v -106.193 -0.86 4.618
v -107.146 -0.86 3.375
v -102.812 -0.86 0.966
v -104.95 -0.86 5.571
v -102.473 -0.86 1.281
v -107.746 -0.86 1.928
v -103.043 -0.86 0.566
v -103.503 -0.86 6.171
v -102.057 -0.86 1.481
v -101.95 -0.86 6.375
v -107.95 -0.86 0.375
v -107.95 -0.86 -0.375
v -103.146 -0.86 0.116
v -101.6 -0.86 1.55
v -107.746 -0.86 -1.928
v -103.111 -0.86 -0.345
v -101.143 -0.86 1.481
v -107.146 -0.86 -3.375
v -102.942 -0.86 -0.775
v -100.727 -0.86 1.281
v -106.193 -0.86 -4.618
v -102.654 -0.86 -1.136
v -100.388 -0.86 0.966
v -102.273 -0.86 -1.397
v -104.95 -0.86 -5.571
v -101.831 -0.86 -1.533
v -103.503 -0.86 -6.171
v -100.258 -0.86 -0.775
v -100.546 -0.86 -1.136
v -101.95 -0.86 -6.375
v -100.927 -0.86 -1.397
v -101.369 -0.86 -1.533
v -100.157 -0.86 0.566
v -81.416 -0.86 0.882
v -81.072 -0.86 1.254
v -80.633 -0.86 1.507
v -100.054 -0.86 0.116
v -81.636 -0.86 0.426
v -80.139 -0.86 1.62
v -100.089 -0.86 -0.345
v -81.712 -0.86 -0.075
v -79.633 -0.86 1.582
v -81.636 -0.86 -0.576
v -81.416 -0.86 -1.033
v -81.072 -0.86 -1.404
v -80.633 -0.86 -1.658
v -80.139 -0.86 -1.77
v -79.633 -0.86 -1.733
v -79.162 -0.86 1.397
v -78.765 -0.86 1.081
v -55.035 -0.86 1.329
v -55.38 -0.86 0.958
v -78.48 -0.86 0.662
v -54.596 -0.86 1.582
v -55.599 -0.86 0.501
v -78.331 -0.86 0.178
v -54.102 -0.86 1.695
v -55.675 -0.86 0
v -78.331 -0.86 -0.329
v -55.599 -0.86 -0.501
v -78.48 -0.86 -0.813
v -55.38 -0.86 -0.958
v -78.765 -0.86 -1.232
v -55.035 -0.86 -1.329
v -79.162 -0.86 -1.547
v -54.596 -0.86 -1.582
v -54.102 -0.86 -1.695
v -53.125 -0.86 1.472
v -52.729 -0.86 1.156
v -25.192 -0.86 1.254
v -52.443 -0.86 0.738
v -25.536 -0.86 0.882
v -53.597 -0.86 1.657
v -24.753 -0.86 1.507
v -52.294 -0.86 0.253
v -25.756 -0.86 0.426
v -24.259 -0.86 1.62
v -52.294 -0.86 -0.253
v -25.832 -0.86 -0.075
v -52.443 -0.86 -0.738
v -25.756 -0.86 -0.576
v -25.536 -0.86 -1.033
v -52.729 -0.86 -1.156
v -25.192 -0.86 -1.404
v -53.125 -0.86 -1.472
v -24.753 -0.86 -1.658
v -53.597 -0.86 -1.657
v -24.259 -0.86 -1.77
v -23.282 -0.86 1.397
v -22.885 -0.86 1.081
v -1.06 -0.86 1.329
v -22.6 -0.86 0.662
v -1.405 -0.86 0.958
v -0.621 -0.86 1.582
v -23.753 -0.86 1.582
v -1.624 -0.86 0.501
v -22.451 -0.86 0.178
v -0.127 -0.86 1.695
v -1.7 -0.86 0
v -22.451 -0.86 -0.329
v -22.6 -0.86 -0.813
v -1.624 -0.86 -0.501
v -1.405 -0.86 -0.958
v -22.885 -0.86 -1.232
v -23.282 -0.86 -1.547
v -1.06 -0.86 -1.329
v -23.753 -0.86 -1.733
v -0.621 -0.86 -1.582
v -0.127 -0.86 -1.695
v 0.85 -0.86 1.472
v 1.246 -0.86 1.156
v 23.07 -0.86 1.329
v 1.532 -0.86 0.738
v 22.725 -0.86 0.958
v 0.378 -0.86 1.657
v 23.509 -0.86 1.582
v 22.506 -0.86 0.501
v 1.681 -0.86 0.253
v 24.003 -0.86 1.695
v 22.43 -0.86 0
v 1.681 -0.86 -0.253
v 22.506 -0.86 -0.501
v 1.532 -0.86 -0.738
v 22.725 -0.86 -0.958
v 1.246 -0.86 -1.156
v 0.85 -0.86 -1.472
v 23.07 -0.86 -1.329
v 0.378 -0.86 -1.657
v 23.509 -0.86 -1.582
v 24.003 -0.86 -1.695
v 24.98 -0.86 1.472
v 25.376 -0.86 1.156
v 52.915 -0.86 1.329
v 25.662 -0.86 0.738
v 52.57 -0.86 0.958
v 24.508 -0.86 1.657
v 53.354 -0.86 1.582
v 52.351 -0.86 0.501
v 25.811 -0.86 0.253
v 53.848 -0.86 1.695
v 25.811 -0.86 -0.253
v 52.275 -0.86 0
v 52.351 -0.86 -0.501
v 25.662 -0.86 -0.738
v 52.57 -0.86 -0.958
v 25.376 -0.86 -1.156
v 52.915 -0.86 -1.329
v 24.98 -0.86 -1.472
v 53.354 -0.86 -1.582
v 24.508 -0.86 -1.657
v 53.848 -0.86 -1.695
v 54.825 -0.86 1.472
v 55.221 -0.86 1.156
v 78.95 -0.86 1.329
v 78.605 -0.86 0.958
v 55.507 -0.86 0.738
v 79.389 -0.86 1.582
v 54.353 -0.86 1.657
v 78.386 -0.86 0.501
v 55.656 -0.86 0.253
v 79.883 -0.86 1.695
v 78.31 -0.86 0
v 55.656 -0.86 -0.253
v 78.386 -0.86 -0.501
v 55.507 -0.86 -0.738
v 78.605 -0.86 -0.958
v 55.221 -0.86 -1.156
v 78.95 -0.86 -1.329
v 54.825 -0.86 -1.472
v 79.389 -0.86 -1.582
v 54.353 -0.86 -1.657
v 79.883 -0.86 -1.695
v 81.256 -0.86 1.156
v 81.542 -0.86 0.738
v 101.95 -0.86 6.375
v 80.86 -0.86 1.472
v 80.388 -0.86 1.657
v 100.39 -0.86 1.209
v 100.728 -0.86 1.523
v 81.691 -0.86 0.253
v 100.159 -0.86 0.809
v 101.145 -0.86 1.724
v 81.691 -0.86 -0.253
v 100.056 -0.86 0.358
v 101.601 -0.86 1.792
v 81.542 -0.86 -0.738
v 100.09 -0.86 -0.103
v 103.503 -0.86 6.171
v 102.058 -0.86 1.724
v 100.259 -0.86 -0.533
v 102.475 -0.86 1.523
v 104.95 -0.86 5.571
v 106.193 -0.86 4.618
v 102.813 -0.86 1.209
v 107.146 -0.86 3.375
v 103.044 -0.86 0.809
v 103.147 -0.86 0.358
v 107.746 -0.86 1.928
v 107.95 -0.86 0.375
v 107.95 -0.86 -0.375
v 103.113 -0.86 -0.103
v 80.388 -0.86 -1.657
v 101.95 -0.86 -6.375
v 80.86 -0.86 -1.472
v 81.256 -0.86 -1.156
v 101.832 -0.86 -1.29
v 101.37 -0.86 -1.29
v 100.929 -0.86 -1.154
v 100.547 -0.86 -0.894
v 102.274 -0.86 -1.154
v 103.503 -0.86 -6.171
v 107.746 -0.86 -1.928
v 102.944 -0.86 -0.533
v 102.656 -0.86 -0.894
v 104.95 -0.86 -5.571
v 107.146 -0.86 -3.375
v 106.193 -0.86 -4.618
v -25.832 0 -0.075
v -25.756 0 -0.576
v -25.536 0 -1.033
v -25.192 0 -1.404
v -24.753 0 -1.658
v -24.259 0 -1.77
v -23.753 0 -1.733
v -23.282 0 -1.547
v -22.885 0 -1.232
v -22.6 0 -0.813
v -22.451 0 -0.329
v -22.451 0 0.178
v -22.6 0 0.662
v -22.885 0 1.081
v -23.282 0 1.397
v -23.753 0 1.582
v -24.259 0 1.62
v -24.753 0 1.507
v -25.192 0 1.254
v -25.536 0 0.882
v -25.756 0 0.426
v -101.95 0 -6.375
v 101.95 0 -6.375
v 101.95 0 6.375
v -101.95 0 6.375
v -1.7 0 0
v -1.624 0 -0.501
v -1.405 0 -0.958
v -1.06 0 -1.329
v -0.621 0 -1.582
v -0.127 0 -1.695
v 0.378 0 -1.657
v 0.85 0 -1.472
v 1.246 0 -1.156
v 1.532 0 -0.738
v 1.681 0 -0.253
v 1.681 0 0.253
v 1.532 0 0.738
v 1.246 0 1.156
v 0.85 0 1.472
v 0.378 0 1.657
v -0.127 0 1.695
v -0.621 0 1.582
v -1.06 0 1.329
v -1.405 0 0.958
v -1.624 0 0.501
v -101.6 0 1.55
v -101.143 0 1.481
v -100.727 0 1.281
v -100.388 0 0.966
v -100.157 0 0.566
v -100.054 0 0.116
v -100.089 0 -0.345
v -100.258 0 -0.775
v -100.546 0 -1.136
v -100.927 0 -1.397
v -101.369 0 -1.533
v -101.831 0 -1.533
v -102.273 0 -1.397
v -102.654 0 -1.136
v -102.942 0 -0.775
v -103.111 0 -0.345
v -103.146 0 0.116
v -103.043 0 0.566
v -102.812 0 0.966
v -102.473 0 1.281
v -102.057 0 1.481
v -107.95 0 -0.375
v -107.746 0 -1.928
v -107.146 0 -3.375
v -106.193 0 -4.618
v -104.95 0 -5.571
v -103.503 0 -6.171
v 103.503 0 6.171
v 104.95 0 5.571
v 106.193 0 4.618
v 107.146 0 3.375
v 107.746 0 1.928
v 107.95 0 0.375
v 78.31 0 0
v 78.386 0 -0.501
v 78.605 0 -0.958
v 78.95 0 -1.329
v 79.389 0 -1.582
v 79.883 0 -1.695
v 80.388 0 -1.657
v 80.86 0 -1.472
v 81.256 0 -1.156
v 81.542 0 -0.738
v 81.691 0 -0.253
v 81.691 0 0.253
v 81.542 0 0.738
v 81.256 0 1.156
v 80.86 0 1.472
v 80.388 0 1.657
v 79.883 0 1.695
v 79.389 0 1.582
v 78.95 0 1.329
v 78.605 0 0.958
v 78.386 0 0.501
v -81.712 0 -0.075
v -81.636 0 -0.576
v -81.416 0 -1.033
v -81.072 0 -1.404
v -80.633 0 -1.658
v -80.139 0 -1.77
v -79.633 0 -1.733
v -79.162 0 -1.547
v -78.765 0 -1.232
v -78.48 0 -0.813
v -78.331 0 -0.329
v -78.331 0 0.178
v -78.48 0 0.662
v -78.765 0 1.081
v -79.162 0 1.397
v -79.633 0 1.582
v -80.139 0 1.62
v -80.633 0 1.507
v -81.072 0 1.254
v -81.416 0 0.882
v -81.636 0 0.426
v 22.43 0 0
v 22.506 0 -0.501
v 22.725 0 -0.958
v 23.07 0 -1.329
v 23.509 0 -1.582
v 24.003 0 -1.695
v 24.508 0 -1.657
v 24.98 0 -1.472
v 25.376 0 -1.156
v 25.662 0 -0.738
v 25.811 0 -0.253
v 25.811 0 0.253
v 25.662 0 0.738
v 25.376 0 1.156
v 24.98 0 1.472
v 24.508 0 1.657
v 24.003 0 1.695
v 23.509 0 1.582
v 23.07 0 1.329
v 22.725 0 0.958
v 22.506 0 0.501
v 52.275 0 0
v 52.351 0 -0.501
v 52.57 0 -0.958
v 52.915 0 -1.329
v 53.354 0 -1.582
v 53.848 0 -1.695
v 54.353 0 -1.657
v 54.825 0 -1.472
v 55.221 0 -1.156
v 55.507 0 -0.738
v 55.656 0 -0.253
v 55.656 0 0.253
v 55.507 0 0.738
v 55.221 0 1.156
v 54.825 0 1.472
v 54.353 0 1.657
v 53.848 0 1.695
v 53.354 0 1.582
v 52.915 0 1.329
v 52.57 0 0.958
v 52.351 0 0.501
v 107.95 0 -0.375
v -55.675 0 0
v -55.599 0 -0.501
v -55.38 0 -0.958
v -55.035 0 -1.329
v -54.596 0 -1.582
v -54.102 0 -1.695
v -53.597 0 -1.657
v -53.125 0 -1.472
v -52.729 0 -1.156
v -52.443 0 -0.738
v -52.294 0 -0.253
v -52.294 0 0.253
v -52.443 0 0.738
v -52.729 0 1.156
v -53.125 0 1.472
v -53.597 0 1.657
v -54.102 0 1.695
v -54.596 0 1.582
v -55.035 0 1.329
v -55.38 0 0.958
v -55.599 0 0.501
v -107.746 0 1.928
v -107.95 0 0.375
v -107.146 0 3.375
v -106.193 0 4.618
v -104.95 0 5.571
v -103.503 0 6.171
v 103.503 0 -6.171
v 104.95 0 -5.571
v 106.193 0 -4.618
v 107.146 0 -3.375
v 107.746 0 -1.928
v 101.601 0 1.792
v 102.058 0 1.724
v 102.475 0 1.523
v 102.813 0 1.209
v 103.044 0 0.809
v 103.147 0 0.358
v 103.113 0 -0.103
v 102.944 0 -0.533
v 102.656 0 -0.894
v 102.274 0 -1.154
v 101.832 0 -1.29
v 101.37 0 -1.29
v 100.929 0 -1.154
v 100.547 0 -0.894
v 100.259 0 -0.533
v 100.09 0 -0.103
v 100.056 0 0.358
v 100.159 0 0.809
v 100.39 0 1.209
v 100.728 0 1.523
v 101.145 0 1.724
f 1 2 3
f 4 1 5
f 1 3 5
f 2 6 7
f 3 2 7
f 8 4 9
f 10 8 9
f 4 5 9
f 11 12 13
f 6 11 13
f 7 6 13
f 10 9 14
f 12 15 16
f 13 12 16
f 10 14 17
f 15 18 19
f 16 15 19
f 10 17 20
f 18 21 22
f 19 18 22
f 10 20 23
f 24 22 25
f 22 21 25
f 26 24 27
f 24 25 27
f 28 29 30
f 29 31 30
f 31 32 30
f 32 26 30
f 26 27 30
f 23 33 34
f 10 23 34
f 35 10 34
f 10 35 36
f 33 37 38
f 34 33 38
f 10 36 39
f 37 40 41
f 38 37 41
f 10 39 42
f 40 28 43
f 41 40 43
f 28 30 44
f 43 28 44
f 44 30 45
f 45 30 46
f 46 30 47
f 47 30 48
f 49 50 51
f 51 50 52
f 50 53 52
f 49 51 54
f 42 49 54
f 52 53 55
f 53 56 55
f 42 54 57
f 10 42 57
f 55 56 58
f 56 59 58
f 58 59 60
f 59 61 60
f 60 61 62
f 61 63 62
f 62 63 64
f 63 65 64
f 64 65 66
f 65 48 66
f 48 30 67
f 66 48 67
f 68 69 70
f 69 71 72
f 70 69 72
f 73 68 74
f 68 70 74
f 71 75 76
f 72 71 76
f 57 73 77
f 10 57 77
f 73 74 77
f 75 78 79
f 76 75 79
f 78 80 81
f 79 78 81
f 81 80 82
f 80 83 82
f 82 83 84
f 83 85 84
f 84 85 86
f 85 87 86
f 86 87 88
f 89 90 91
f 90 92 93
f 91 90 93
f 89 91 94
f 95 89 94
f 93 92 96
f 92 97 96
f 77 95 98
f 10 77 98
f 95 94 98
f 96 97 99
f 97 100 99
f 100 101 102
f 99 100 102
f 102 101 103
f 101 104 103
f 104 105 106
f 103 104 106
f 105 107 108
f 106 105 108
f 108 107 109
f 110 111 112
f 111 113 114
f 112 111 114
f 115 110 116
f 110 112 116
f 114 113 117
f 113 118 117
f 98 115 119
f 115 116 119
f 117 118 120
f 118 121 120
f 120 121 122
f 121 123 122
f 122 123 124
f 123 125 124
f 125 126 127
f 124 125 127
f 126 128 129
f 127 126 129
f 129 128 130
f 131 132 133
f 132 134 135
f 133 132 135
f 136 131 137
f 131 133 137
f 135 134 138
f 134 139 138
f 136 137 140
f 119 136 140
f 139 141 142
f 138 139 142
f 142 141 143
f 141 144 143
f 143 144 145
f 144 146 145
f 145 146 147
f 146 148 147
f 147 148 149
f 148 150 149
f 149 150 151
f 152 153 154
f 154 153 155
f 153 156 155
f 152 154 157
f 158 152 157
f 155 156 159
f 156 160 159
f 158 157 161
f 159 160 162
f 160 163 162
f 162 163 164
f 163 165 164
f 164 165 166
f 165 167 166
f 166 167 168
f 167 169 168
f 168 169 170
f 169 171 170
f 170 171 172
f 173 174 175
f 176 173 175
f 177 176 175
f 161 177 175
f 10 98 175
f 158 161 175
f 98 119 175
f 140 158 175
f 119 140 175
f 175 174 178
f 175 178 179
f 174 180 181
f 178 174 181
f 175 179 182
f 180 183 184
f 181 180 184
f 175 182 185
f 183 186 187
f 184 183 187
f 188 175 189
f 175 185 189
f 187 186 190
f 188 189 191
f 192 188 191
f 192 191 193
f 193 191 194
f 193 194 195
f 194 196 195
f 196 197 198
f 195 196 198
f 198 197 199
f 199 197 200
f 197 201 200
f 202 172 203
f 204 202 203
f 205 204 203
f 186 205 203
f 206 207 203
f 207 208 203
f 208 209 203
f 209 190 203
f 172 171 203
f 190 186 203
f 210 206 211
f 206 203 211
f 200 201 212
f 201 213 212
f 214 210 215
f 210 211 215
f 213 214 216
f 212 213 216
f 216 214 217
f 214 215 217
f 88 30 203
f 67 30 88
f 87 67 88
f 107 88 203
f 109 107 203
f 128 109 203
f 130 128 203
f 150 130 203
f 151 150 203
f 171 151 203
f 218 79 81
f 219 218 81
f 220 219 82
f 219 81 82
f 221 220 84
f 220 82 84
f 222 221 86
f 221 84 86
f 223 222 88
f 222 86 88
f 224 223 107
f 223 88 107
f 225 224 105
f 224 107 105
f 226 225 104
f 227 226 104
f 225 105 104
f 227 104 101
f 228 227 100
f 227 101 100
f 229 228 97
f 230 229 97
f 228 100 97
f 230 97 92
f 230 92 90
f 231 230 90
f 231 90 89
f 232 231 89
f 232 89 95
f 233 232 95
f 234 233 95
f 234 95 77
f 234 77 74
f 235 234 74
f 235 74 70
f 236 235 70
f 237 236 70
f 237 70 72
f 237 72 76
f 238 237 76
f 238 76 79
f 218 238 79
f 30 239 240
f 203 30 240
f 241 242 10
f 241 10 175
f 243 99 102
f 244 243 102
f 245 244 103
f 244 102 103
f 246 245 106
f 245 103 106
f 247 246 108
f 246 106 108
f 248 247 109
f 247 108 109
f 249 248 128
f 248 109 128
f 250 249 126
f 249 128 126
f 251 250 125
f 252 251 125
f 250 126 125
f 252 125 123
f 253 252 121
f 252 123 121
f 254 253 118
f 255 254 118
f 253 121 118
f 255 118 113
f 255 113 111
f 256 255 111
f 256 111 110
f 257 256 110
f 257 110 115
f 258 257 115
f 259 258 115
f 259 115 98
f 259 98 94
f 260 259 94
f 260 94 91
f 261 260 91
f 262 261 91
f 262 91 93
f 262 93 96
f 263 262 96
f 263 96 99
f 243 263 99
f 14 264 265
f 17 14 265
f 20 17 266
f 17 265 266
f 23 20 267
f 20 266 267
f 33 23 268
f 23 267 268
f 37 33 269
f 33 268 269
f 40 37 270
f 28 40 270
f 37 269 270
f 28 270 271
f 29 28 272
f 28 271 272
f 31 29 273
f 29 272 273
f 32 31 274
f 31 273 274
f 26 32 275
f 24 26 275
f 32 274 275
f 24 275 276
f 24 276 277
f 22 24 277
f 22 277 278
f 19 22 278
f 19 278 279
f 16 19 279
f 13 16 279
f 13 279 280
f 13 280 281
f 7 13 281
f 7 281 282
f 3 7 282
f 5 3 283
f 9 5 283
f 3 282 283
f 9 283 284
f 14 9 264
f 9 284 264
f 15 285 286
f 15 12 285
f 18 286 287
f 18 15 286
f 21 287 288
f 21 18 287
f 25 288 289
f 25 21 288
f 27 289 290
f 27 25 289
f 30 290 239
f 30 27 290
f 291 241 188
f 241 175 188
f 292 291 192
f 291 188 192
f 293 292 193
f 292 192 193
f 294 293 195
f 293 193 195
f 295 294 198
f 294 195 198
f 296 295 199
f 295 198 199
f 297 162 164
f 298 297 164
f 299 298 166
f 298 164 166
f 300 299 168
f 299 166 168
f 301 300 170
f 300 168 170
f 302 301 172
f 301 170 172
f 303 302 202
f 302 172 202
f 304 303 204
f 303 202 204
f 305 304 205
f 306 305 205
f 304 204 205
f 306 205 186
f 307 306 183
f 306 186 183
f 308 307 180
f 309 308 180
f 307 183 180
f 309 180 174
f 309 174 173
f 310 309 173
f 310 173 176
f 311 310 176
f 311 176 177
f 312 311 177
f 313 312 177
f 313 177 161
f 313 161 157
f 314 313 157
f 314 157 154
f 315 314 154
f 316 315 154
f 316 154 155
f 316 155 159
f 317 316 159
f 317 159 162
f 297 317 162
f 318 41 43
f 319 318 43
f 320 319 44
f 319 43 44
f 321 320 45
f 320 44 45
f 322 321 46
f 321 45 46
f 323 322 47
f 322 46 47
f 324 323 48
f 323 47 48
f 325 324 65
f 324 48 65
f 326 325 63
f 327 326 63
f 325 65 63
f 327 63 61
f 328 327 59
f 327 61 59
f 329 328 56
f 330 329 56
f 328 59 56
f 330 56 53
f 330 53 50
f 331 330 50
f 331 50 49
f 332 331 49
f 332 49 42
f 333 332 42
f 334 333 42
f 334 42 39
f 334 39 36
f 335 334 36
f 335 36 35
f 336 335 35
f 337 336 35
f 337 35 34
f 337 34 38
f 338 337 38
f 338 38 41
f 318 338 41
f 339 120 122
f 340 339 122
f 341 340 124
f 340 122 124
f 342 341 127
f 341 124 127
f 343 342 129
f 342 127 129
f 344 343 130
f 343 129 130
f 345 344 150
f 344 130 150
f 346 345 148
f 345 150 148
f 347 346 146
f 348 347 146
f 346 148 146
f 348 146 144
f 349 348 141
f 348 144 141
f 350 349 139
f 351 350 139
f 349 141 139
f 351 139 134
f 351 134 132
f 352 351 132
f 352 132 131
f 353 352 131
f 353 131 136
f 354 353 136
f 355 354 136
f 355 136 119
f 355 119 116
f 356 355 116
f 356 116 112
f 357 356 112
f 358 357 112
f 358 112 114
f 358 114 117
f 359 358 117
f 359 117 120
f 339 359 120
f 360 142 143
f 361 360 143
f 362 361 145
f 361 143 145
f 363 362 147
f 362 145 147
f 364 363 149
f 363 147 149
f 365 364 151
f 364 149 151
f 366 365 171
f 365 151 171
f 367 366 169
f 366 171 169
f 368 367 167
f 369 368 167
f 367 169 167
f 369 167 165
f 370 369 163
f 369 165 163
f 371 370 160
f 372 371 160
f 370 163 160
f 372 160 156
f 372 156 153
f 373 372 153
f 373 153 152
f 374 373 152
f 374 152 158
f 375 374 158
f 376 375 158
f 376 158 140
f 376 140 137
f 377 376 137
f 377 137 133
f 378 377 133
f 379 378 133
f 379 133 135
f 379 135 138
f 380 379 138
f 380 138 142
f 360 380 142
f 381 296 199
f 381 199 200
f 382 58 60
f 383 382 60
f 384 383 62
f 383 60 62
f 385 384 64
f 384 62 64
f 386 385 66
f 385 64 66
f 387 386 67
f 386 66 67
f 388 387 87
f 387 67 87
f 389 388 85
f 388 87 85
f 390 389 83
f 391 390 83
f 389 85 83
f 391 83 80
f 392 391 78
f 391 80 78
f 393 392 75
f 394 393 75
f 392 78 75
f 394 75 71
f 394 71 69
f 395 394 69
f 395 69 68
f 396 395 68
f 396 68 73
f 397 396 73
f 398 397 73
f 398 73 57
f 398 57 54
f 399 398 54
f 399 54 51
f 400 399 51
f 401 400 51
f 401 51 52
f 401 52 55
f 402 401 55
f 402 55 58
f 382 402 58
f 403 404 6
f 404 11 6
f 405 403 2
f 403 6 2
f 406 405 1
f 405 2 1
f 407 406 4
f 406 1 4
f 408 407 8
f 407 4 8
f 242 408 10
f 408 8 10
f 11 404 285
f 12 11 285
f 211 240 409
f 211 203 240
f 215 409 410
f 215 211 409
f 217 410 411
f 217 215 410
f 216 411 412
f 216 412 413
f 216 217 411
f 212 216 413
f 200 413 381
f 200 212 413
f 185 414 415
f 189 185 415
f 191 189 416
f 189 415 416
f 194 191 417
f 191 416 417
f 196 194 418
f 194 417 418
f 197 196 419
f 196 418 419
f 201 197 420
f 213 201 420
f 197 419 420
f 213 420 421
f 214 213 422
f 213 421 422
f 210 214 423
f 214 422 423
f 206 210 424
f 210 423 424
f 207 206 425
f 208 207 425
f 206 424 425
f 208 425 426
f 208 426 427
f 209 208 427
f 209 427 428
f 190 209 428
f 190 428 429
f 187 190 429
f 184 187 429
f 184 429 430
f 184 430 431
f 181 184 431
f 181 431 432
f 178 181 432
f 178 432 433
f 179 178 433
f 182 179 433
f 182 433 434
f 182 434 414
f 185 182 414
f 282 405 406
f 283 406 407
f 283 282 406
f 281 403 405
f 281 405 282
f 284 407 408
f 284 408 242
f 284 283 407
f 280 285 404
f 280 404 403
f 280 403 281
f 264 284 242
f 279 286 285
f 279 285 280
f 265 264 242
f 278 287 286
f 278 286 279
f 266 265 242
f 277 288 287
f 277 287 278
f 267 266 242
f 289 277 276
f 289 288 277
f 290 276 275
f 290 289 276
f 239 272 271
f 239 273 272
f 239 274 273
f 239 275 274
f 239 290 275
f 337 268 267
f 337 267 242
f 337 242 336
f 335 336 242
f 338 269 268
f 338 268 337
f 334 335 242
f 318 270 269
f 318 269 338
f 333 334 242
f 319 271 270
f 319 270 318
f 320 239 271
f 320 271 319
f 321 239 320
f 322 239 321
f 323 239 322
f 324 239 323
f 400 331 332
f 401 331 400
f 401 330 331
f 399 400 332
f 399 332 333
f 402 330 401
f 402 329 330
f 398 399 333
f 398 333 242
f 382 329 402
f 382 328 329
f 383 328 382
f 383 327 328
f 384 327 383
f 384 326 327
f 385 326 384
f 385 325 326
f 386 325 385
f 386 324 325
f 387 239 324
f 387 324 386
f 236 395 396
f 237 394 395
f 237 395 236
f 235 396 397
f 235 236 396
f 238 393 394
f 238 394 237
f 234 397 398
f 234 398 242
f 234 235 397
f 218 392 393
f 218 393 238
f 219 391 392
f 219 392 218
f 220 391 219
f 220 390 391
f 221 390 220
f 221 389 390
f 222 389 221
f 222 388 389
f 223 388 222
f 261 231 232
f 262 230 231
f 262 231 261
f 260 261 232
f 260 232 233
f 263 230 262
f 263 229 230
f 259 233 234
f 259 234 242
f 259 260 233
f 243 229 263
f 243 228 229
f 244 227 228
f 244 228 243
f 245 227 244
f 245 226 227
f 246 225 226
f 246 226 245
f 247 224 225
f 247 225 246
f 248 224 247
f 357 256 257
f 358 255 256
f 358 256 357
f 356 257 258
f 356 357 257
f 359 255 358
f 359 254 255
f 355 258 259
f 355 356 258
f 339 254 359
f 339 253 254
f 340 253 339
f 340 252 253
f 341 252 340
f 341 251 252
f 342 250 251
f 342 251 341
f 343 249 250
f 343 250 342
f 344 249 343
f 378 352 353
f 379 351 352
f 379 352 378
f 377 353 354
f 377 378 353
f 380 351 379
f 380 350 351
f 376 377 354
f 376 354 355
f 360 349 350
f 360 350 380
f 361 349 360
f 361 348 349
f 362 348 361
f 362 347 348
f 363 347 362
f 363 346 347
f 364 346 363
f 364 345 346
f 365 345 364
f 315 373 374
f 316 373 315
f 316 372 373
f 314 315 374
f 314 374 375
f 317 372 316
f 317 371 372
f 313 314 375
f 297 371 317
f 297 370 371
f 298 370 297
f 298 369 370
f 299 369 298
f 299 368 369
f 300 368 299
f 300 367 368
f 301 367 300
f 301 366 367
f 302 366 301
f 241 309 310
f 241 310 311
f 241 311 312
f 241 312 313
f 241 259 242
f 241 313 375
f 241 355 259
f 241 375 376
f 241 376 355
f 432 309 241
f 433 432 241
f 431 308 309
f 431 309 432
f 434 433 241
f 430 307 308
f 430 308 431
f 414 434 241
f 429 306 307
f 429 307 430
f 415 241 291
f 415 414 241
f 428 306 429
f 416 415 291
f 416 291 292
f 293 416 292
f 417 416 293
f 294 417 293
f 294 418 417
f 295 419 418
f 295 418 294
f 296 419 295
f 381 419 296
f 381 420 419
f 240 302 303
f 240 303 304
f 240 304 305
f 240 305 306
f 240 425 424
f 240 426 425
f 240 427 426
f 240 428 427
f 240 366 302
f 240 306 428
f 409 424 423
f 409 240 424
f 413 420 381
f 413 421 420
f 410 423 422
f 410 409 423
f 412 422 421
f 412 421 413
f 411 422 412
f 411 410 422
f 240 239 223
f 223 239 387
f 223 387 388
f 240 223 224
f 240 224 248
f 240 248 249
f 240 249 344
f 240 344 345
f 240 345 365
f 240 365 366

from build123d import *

# Parameters (mm, degrees)
SKETCH1_W                = 215.9
SKETCH1_H                = 12.75
SKETCH1_R                = 1.55
BASE_FLANGE1_DEPTH       = 0.86
FILLET1_R                = 6
M3_CLEARANCE_HOLE1_D     = 3.4
M3_CLEARANCE_HOLE1_DEPTH = 1.29
M3_CLEARANCE_HOLE1_TIP   = 1.021463052
M3_CLEARANCE_HOLE2_D     = 3.4
M3_CLEARANCE_HOLE2_DEPTH = 1.29
M3_CLEARANCE_HOLE2_TIP   = 1.021463052
SKETCH14_R               = 1.55
CUT_EXTRUDE1_DEPTH       = 82


# Sheet-metal steps are written as plain solids
with BuildPart() as part:
    # Sketch1 → Base-Flange1 (new body)
    with BuildSketch(Plane(origin=(0, 0, 0), x_dir=(1, 0, 0), z_dir=(0, 1, 0))):
        Rectangle(SKETCH1_W, SKETCH1_H)
        with Locations(Location((-101.6, 0, 0), (0, 0, 270))):
            Circle(SKETCH1_R, mode=Mode.SUBTRACT)
    extrude(amount=-BASE_FLANGE1_DEPTH)

    # Fillet1
    fillet1_edges = [part.edges().sort_by_distance(p)[0] for p in [
        (-107.95, -0.43, -6.375),
        (107.95, -0.43, -6.375),
        (107.95, -0.43, 6.375),
        (-107.95, -0.43, 6.375),
    ]]
    fillet(fillet1_edges, radius=FILLET1_R)

    # M3 Clearance Hole1
    with Locations(Plane(origin=(0, 0, 0), x_dir=(1, 0, 0), z_dir=(0, 1, 0))):
        with Locations((-80.011608413, 0.075207541), (-24.131608413, 0.075207541), (80.01, 0), (24.13, 0)):
            Hole(M3_CLEARANCE_HOLE1_D / 2, depth=M3_CLEARANCE_HOLE1_DEPTH)
            with Locations((0, 0, -(M3_CLEARANCE_HOLE1_DEPTH + M3_CLEARANCE_HOLE1_TIP / 2))):  # 118° drill point
                Cone(0, M3_CLEARANCE_HOLE1_D / 2, M3_CLEARANCE_HOLE1_TIP, mode=Mode.SUBTRACT)

    # M3 Clearance Hole2
    with Locations(Plane(origin=(0, 0, 0), x_dir=(1, 0, 0), z_dir=(0, 1, 0))):
        with Locations((0, 0), (-53.975, 0), (53.975, 0)):
            Hole(M3_CLEARANCE_HOLE2_D / 2, depth=M3_CLEARANCE_HOLE2_DEPTH)
            with Locations((0, 0, -(M3_CLEARANCE_HOLE2_DEPTH + M3_CLEARANCE_HOLE2_TIP / 2))):  # 118° drill point
                Cone(0, M3_CLEARANCE_HOLE2_D / 2, M3_CLEARANCE_HOLE2_TIP, mode=Mode.SUBTRACT)

    # Sketch14 → Cut-Extrude1 (cut)
    with BuildSketch(Plane(origin=(0, 0, 0), x_dir=(1, 0, 0), z_dir=(0, 1, 0))):
        with Locations(Location((101.601385273, -0.242368773, 0), (0, 0, 270))):
            Circle(SKETCH14_R)
    extrude(amount=-CUT_EXTRUDE1_DEPTH, mode=Mode.SUBTRACT)


solid = part.part
